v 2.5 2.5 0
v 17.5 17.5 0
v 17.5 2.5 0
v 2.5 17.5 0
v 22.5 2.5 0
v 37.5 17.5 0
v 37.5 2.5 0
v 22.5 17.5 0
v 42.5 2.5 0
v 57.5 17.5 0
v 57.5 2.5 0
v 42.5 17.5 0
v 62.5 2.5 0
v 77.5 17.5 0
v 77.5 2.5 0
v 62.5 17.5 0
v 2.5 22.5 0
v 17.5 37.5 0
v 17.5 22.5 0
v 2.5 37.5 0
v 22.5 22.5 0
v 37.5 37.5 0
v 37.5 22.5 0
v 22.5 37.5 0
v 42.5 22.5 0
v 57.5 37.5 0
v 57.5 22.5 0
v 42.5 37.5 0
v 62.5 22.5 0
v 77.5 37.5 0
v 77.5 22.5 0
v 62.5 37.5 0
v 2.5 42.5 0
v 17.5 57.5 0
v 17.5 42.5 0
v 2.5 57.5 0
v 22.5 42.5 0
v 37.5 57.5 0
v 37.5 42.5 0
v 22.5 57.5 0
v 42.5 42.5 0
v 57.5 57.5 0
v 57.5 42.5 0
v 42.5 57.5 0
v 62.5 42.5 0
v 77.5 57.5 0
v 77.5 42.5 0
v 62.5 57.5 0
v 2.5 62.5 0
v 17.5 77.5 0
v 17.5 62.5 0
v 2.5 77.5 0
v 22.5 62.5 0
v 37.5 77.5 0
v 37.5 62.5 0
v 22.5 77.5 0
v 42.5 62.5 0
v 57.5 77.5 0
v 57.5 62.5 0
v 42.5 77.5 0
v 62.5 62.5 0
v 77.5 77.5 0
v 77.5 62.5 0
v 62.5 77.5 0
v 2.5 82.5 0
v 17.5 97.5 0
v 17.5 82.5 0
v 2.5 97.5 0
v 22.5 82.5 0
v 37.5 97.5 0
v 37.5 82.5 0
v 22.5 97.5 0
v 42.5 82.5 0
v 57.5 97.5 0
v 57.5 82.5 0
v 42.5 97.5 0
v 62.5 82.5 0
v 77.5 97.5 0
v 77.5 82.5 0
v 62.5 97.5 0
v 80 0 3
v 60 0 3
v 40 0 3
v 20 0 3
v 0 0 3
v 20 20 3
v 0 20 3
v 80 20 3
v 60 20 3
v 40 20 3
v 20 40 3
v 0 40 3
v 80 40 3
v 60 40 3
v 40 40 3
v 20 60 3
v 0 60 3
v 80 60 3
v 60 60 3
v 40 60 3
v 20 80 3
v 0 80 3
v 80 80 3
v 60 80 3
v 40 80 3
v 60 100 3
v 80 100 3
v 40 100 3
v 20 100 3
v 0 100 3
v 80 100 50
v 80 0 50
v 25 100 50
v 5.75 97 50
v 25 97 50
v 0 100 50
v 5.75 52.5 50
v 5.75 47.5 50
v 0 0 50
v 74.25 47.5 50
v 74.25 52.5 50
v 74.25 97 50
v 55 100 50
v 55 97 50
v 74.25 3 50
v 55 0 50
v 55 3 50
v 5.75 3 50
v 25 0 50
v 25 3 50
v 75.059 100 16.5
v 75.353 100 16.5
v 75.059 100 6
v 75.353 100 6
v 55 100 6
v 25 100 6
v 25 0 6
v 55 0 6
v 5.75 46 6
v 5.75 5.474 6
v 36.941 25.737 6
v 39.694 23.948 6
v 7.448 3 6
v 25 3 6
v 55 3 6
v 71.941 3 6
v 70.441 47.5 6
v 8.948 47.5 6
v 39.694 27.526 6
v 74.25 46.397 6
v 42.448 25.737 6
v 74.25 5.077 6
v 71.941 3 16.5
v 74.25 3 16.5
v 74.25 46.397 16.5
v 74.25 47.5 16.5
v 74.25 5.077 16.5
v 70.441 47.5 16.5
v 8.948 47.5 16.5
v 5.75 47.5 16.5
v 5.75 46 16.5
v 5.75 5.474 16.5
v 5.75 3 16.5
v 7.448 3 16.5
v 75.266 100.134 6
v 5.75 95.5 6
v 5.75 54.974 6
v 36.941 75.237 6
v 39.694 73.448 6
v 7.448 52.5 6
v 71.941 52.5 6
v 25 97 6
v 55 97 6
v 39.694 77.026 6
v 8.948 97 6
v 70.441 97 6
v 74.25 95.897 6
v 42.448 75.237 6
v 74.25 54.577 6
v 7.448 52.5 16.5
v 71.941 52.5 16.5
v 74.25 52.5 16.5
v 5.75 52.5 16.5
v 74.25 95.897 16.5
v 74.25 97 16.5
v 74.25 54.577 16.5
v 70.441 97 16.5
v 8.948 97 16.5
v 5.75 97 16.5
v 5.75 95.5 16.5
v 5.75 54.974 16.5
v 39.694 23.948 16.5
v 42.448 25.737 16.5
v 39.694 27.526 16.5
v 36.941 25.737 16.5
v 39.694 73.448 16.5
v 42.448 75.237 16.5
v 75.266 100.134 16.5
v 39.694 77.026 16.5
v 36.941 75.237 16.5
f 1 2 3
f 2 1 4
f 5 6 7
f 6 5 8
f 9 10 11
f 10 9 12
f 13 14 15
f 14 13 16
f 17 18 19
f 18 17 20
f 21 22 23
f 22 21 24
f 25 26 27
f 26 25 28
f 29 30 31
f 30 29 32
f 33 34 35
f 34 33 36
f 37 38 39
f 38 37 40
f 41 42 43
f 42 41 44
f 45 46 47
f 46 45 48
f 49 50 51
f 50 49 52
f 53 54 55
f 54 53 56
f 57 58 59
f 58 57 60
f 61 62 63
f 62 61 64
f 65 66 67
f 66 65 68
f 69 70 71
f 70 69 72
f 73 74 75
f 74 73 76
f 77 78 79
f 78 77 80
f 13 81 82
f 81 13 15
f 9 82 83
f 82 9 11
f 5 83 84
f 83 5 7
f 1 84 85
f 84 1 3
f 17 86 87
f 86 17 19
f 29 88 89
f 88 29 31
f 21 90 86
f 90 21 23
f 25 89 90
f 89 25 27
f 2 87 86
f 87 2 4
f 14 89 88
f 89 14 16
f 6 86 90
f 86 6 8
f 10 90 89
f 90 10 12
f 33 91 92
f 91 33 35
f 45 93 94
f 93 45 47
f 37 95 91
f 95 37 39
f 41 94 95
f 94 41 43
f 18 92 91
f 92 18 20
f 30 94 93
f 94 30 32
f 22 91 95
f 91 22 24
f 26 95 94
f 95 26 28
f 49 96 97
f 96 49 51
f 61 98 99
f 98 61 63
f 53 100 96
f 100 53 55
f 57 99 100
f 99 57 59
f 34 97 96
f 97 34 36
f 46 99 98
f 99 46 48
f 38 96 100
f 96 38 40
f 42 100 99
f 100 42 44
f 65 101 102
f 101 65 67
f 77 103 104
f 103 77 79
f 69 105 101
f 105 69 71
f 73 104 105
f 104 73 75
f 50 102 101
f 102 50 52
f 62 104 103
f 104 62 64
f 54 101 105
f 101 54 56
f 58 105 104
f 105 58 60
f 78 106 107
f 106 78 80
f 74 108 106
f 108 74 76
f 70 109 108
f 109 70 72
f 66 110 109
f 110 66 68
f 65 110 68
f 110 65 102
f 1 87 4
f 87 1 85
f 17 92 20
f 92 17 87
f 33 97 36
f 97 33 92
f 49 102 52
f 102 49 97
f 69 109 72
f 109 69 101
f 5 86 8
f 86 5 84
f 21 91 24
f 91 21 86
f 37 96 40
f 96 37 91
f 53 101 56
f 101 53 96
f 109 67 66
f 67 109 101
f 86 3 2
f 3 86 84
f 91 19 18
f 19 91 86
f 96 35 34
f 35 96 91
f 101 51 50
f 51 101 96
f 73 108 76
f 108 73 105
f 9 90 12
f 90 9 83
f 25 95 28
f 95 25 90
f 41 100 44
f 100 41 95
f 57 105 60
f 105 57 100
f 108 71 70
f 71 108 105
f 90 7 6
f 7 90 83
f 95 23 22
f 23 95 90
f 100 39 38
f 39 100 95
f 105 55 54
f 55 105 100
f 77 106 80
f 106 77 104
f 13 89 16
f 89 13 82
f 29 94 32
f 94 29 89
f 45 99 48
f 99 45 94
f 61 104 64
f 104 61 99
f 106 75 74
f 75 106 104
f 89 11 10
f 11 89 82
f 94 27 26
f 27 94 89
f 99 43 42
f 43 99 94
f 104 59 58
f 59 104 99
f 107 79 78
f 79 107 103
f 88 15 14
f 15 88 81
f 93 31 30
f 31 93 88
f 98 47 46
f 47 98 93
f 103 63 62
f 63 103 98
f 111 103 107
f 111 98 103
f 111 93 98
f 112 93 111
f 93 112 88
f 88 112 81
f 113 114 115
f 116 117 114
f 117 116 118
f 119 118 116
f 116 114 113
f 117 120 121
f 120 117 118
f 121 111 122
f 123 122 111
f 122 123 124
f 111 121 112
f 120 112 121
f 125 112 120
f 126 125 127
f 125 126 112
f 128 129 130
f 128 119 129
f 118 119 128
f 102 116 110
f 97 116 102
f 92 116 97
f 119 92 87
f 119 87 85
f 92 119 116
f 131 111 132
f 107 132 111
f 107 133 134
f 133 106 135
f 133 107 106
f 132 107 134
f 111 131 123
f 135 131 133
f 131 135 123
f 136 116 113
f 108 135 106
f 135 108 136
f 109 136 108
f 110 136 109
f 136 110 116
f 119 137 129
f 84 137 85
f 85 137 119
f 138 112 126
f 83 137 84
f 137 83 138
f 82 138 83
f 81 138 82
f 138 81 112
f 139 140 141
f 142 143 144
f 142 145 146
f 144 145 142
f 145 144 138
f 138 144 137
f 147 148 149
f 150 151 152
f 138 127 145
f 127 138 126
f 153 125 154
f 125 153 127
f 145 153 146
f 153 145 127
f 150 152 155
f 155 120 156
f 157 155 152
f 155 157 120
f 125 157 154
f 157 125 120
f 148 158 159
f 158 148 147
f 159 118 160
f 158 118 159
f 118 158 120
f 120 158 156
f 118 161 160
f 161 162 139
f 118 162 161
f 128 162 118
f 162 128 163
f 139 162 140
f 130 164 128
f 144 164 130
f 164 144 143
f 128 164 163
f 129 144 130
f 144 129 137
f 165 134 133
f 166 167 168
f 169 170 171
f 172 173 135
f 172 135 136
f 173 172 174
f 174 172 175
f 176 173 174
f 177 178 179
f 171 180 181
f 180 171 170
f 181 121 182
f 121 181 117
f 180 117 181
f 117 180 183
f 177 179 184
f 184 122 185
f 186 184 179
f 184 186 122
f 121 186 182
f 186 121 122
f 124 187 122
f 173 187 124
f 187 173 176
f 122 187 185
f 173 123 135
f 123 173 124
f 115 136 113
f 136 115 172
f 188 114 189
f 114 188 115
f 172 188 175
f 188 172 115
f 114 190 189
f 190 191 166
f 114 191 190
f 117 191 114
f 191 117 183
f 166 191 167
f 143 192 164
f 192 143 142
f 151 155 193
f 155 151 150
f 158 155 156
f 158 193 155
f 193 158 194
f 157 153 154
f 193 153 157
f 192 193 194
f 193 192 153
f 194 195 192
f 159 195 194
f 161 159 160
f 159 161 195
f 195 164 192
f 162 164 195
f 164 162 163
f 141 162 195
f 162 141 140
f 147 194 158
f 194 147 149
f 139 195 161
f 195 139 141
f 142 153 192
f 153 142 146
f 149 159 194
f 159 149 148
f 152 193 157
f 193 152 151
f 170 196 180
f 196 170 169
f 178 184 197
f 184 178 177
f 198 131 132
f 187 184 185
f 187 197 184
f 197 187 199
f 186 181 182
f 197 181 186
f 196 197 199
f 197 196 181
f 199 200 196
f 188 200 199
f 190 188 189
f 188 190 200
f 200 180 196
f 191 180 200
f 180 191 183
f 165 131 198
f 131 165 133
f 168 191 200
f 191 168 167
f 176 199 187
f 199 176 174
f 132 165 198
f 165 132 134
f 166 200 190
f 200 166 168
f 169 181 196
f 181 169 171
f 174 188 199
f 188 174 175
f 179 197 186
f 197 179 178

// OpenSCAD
// file: ../common.scad
BASE_TILE_SIZE=20;
BASE_WIDTH=5;
PEAK_HEIGHT=3;

function y_up() = [90, 0, 0];
function x_up() = [90, 0, 90];

function min_floor_offset(wall_width) = wall_width + PEAK_HEIGHT;
function tri_mid() = BASE_WIDTH / 2;
function triangle() = [[0, 0],[BASE_WIDTH, 0],[tri_mid(), PEAK_HEIGHT]];
function base_tile_size() = BASE_TILE_SIZE;
function peak_height() = PEAK_HEIGHT;

function isX(direction) = (direction == "x");

module grid(width, depth, direction) {
    length = isX(direction) ? width : depth;
    slot_length = isX(direction) ? depth : width;
    translate_z = isX(direction) ? -slot_length : 0;
    rot = isX(direction) ? y_up() : x_up();

    // This is the total additional slots past the initial one
    total_slots = floor(length / BASE_TILE_SIZE);

    for (i = [0 : total_slots]) {
        offset = -tri_mid() + BASE_TILE_SIZE * i;
        rotate(rot)
        translate([offset, 0, translate_z])
        linear_extrude(height = slot_length)
        polygon(points=triangle());
    }
}

module grid_slots(width, depth) {
    grid(width, depth, "y");
    grid(width, depth, "x");
}

module base_block(width, depth, height, include_grid = true) {
    difference() {
        cube([width, depth, height]);

        if (include_grid) {
            grid_slots(width, depth);
        }
    }
}
// file: ../chip_holder.scad
use <common.scad>

MAX_THUMB_WIDTH = 30;
WAY_DEEP = 100;

module generate_holder(
    tile_columns = 4,
    tile_rows = 2,
    tile_width = 33,
    tile_depth = 33,
    tile_count = 20,
    tile_height = 1.75,
    wall_width = 3,
    box_height = 69,
    box_clearence = 15.75,
    round_to_full_base = true,
    fit_to_box_height = true,
    hollow_bottom = false,
    include_grid = true
) {
    function getSize(count, tile_size) = count * (tile_size + wall_width) + wall_width;
    function roundFullBase(count, tile_size) = (round_to_full_base) ? ceil(getSize(count, tile_size) / base_tile_size()) * base_tile_size() : getSize(count, tile_size);
    function max_height() = box_height - box_clearence;

    slot_height = tile_count * tile_height;
    min_floor_offset = min_floor_offset(wall_width);
    min_height = slot_height + min_floor_offset;
    total_height = (fit_to_box_height) ? max(max_height(), min_height) : min_height;
    inside_height = (hollow_bottom) ? total_height - min_floor_offset : slot_height;
    floor_offset = (fit_to_box_height) ? max_height() - inside_height : min_floor_offset;

    total_width = roundFullBase(tile_columns, tile_width);
    total_depth = roundFullBase(tile_rows, tile_depth);

    row_width = tile_depth * tile_rows;
    col_width = tile_width * tile_columns;
    outside_walls = wall_width * 2;

    col_spread = (tile_columns > 1) ? (total_width - col_width - outside_walls) / (tile_columns - 1) : 0;
    row_spread = (tile_rows > 1) ? (total_depth - row_width - outside_walls) / (tile_rows - 1) : 0;

    function colOffset(i) = (tile_columns == 1) ?
        (total_width - tile_width) / 2 :
        wall_width + ((tile_width + col_spread) * i);
    function rowOffset(i) = (tile_rows == 1) ?
        (total_depth - tile_depth) / 2 :
        wall_width + ((tile_depth + row_spread) * i);

    module tile_slot() {
        translate([0, 0, 0])
        square([tile_width, tile_depth]);
    }

    module thumb_slot_front() {
        width = min(tile_width - (wall_width * 2), MAX_THUMB_WIDTH);
        side_offset = (tile_width - width) / 2;
        translate([side_offset, -WAY_DEEP, 0])
        square([width, WAY_DEEP]);
    }

    module thumb_slot_back() {
        width = min(tile_width - (wall_width * 2), MAX_THUMB_WIDTH);
        side_offset = (tile_width - width) / 2;
        translate([side_offset, tile_depth, 0])
        square([width, WAY_DEEP]);
    }

    module tile_hole(slot_type = "none") {
        box_bottom = floor_offset;
        translate([0, 0, box_bottom])
        linear_extrude(height = inside_height)
        union() {
            tile_slot();
            if (slot_type == "front" || slot_type == "both") {
                thumb_slot_front();
            }

            if (slot_type == "back" || slot_type == "both") {
                thumb_slot_back();
            }
        }
    }

    module tile_holes() {
        for (i = [0 : tile_rows - 1]) {
            for (j = [0 : tile_columns - 1]) {
                slot_type = (tile_rows == 1) ? "both" : (i == 0) ? "front" : (i == tile_rows - 1) ? "back" : "none";
                col_offset = colOffset(j);
                row_offset = rowOffset(i);

                translate([col_offset, row_offset, 0])
                tile_hole(slot_type = slot_type);
            }
        }
    }

    module bottom_x() {
        if (hollow_bottom) {
            for (i = [0 : tile_rows - 1]) {
                for (j = [0 : tile_columns - 1]) {
                    length = sqrt(pow(tile_width, 2) + pow(tile_depth, 2));
                    rot = acos(tile_depth / length);
                    x_height = inside_height - slot_height;
                    z_offset = min_floor_offset(wall_width);

                    col_offset = colOffset(j);
                    row_offset = rowOffset(i);

                    translate([col_offset - wall_width / 2, row_offset + wall_width / 2, z_offset])
                    rotate([0, 0, -rot])
                    cube([wall_width, length + wall_width, x_height]);

                    translate([col_offset + tile_width, row_offset - wall_width / 2, z_offset])
                    rotate([0, 0, rot])
                    cube([wall_width, length + wall_width, x_height]);
                }
            }
        }
    }

    union() {
        difference() {
            base_block(total_width, total_depth, total_height, include_grid = include_grid);
            tile_holes();
        }
        bottom_x();
    }
}
// file: common.scad
WALL_WIDTH = 3;
BOX_HEIGHT = 50;
BOX_CLEARENCE = 0;
HOLLOW_BOTTOM = true;

function wall_width() = WALL_WIDTH;
function box_height() = BOX_HEIGHT;
function box_clearence() = BOX_CLEARENCE;
function hollow_bottom() = HOLLOW_BOTTOM;
// main file
use <common.scad>
use <../chip_holder.scad>

generate_holder(
    tile_columns = 1,
    tile_rows = 2,
    tile_width = 68.5,
    tile_depth = 44.5,
    tile_count = 1,
    tile_height = 33.5,
    wall_width = wall_width(),
    box_height = box_height(),
    box_clearence = box_clearence(),
    rount_to_full_base = true,
    fit_to_box_height = true,
    hollow_bottom = hollow_bottom()
);
